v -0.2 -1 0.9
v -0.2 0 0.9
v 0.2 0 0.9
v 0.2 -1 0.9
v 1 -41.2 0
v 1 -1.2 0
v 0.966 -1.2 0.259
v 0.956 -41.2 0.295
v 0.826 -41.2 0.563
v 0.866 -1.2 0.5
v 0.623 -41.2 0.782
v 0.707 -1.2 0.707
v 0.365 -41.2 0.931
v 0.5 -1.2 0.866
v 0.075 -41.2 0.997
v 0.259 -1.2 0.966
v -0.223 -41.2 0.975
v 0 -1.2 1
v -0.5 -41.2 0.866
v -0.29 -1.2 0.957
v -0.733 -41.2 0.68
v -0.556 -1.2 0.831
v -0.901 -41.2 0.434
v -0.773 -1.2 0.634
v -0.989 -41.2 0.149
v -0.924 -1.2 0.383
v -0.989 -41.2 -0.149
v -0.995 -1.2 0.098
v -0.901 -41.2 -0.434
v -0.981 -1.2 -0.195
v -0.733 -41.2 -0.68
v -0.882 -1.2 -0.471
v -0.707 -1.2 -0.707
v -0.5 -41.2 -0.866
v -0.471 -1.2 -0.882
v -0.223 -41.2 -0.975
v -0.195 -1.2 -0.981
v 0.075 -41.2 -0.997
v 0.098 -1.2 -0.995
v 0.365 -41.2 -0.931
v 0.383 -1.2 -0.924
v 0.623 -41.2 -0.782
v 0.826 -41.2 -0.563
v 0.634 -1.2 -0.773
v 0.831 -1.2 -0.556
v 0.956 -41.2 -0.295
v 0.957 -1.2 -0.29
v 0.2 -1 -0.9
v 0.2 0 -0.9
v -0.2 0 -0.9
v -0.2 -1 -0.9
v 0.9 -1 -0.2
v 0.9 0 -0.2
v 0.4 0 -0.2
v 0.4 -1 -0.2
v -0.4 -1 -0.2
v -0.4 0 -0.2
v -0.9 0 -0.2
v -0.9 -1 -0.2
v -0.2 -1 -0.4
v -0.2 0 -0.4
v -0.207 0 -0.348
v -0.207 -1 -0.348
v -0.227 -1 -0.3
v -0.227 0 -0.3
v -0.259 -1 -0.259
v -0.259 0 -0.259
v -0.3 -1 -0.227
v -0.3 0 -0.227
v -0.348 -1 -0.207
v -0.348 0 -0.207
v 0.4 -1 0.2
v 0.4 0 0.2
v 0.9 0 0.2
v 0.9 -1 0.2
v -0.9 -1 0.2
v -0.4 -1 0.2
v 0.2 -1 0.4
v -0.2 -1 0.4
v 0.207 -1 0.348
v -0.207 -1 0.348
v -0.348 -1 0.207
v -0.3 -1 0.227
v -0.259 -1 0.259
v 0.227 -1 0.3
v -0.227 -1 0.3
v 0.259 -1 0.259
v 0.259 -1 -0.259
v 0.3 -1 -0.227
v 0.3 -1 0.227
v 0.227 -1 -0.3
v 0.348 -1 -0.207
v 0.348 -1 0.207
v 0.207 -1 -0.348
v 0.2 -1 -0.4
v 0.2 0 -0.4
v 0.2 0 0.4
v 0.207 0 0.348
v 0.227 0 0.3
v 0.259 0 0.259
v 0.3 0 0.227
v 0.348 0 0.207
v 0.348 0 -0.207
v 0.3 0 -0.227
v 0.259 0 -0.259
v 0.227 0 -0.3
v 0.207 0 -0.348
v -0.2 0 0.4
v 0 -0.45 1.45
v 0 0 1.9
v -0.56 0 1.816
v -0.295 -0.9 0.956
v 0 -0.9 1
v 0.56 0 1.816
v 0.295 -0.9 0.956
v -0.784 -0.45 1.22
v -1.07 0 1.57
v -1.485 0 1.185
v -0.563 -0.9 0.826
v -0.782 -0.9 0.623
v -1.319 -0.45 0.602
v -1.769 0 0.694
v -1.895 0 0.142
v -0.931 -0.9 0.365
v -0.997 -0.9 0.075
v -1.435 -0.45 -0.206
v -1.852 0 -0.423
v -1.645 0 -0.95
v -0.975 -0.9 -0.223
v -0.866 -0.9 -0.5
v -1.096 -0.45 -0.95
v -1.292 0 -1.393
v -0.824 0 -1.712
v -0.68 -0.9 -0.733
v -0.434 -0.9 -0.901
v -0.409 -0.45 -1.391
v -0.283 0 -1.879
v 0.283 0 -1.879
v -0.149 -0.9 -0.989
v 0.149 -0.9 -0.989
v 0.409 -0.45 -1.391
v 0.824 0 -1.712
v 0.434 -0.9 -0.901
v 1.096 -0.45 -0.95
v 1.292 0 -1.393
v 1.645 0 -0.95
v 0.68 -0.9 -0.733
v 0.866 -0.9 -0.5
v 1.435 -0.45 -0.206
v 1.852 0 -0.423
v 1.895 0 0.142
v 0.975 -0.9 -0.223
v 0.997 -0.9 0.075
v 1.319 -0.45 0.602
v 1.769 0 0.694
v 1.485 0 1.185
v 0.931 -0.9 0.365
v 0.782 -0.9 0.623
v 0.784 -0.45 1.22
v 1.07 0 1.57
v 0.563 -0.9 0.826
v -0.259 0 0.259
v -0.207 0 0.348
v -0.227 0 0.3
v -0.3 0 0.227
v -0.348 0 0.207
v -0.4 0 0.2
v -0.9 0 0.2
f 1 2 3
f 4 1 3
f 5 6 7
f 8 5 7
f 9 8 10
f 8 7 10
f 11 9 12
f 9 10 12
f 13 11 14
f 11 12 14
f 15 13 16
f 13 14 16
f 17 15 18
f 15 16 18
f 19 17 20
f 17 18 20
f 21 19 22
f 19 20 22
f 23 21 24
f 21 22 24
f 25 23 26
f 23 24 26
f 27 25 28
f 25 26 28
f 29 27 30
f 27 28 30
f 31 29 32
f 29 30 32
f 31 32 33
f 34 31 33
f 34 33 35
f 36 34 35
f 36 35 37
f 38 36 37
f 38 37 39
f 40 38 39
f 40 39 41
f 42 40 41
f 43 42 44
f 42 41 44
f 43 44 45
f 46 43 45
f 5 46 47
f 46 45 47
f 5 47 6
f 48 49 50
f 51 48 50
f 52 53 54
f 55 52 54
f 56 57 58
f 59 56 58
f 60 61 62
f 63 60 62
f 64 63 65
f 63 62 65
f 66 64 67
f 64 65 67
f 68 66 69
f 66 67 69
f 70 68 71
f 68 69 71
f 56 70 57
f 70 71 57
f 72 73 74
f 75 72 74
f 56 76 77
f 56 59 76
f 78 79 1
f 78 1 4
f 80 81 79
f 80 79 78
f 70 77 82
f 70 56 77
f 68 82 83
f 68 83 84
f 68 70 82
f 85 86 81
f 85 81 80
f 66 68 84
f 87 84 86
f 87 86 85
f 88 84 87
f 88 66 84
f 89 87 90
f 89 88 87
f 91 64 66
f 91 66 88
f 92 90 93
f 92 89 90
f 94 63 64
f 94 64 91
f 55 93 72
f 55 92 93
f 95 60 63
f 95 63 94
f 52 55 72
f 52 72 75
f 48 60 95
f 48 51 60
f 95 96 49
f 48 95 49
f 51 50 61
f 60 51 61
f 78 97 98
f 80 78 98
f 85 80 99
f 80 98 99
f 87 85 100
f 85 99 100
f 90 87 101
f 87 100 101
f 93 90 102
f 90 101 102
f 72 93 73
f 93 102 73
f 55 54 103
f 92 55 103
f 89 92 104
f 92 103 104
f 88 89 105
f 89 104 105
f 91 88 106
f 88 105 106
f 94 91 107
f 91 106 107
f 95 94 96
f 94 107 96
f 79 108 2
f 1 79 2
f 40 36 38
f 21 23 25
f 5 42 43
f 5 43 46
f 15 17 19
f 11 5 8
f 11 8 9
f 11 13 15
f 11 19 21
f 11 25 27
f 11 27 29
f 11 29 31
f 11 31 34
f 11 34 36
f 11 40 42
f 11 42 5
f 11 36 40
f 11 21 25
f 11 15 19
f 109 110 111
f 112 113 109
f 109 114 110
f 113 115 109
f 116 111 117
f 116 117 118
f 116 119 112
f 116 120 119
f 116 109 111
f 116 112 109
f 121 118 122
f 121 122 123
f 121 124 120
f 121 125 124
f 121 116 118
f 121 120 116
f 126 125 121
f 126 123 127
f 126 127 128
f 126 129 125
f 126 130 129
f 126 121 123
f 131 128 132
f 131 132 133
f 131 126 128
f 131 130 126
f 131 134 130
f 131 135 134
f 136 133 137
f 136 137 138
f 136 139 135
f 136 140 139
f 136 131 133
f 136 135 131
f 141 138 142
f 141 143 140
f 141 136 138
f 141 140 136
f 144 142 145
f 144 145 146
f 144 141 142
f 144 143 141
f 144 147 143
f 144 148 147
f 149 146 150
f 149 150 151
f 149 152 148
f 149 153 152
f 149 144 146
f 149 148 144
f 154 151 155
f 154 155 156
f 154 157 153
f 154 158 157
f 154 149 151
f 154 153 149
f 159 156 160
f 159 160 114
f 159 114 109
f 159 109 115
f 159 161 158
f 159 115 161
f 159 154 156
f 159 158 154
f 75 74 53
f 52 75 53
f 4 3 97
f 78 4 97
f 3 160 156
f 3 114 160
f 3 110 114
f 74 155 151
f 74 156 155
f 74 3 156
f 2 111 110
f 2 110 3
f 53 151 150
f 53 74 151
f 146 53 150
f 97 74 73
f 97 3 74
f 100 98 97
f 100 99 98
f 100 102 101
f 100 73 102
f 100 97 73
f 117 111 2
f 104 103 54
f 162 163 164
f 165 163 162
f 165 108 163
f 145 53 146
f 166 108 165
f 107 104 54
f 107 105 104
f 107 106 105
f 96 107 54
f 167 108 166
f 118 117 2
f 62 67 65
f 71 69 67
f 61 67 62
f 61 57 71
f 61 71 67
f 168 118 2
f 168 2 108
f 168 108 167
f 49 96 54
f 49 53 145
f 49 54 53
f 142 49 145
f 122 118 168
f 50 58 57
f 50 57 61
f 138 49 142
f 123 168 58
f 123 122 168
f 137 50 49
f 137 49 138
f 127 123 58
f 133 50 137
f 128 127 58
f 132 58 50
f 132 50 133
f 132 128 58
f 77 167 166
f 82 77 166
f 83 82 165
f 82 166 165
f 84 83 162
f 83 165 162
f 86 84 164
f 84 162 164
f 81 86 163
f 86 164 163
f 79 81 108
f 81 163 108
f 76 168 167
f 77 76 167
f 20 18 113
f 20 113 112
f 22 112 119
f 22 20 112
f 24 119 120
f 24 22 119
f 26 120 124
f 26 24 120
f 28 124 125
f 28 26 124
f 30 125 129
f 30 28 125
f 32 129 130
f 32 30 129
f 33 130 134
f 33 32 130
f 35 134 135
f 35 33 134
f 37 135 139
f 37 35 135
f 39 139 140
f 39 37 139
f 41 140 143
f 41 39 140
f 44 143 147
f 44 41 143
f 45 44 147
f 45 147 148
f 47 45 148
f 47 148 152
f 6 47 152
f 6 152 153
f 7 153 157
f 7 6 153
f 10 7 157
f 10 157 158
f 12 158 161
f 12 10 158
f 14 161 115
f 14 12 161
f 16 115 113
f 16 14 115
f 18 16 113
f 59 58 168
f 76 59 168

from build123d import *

# Parameters (mm, degrees)
SKETCH2_R           = 1
BOSS_EXTRUDE1_DEPTH = 40
CUT_EXTRUDE1_DEPTH  = 1


with BuildPart() as part:
    # Sketch1 → Revolve1 (revolve)
    with BuildSketch(Plane(origin=(0, 0, 0), x_dir=(0, 0, -1), z_dir=(1, 0, 0))):
        Polygon((0, 0), (-1.9, 0), (-1, -0.9), (-1, -1.2), (0, -1.2), align=None)
    revolve(axis=Axis((0, 0.872326939, 0), (0, -1, 0)))

    # Sketch2 → Boss-Extrude1 (add)
    with BuildSketch(Plane.XZ.offset(1.2)):
        Circle(SKETCH2_R)
    extrude(amount=BOSS_EXTRUDE1_DEPTH)

    # Sketch3 → Cut-Extrude1 (cut)
    with BuildSketch(Plane(origin=(0, 0, 0), x_dir=(1, 0, 0), z_dir=(0, 1, 0))):
        with BuildLine():
            Line((-0.9, -0.2), (-0.4, -0.2))
            ThreePointArc((-0.4, -0.2), (-0.258578644, -0.258578644), (-0.2, -0.4))
            Line((-0.2, -0.4), (-0.2, -0.9))
            Line((-0.2, -0.9), (0.2, -0.9))
            Line((0.2, -0.9), (0.2, -0.4))
            ThreePointArc((0.2, -0.4), (0.258578644, -0.258578644), (0.4, -0.2))
            Line((0.4, -0.2), (0.9, -0.2))
            Line((0.9, -0.2), (0.9, 0.2))
            Line((0.9, 0.2), (0.4, 0.2))
            ThreePointArc((0.4, 0.2), (0.258578644, 0.258578644), (0.2, 0.4))
            Line((0.2, 0.4), (0.2, 0.9))
            Line((0.2, 0.9), (-0.2, 0.9))
            Line((-0.2, 0.9), (-0.2, 0.4))
            ThreePointArc((-0.2, 0.4), (-0.258578644, 0.258578644), (-0.4, 0.2))
            Line((-0.4, 0.2), (-0.9, 0.2))
            Line((-0.9, 0.2), (-0.9, -0.2))
        make_face()
    extrude(amount=-CUT_EXTRUDE1_DEPTH, mode=Mode.SUBTRACT)


solid = part.part
